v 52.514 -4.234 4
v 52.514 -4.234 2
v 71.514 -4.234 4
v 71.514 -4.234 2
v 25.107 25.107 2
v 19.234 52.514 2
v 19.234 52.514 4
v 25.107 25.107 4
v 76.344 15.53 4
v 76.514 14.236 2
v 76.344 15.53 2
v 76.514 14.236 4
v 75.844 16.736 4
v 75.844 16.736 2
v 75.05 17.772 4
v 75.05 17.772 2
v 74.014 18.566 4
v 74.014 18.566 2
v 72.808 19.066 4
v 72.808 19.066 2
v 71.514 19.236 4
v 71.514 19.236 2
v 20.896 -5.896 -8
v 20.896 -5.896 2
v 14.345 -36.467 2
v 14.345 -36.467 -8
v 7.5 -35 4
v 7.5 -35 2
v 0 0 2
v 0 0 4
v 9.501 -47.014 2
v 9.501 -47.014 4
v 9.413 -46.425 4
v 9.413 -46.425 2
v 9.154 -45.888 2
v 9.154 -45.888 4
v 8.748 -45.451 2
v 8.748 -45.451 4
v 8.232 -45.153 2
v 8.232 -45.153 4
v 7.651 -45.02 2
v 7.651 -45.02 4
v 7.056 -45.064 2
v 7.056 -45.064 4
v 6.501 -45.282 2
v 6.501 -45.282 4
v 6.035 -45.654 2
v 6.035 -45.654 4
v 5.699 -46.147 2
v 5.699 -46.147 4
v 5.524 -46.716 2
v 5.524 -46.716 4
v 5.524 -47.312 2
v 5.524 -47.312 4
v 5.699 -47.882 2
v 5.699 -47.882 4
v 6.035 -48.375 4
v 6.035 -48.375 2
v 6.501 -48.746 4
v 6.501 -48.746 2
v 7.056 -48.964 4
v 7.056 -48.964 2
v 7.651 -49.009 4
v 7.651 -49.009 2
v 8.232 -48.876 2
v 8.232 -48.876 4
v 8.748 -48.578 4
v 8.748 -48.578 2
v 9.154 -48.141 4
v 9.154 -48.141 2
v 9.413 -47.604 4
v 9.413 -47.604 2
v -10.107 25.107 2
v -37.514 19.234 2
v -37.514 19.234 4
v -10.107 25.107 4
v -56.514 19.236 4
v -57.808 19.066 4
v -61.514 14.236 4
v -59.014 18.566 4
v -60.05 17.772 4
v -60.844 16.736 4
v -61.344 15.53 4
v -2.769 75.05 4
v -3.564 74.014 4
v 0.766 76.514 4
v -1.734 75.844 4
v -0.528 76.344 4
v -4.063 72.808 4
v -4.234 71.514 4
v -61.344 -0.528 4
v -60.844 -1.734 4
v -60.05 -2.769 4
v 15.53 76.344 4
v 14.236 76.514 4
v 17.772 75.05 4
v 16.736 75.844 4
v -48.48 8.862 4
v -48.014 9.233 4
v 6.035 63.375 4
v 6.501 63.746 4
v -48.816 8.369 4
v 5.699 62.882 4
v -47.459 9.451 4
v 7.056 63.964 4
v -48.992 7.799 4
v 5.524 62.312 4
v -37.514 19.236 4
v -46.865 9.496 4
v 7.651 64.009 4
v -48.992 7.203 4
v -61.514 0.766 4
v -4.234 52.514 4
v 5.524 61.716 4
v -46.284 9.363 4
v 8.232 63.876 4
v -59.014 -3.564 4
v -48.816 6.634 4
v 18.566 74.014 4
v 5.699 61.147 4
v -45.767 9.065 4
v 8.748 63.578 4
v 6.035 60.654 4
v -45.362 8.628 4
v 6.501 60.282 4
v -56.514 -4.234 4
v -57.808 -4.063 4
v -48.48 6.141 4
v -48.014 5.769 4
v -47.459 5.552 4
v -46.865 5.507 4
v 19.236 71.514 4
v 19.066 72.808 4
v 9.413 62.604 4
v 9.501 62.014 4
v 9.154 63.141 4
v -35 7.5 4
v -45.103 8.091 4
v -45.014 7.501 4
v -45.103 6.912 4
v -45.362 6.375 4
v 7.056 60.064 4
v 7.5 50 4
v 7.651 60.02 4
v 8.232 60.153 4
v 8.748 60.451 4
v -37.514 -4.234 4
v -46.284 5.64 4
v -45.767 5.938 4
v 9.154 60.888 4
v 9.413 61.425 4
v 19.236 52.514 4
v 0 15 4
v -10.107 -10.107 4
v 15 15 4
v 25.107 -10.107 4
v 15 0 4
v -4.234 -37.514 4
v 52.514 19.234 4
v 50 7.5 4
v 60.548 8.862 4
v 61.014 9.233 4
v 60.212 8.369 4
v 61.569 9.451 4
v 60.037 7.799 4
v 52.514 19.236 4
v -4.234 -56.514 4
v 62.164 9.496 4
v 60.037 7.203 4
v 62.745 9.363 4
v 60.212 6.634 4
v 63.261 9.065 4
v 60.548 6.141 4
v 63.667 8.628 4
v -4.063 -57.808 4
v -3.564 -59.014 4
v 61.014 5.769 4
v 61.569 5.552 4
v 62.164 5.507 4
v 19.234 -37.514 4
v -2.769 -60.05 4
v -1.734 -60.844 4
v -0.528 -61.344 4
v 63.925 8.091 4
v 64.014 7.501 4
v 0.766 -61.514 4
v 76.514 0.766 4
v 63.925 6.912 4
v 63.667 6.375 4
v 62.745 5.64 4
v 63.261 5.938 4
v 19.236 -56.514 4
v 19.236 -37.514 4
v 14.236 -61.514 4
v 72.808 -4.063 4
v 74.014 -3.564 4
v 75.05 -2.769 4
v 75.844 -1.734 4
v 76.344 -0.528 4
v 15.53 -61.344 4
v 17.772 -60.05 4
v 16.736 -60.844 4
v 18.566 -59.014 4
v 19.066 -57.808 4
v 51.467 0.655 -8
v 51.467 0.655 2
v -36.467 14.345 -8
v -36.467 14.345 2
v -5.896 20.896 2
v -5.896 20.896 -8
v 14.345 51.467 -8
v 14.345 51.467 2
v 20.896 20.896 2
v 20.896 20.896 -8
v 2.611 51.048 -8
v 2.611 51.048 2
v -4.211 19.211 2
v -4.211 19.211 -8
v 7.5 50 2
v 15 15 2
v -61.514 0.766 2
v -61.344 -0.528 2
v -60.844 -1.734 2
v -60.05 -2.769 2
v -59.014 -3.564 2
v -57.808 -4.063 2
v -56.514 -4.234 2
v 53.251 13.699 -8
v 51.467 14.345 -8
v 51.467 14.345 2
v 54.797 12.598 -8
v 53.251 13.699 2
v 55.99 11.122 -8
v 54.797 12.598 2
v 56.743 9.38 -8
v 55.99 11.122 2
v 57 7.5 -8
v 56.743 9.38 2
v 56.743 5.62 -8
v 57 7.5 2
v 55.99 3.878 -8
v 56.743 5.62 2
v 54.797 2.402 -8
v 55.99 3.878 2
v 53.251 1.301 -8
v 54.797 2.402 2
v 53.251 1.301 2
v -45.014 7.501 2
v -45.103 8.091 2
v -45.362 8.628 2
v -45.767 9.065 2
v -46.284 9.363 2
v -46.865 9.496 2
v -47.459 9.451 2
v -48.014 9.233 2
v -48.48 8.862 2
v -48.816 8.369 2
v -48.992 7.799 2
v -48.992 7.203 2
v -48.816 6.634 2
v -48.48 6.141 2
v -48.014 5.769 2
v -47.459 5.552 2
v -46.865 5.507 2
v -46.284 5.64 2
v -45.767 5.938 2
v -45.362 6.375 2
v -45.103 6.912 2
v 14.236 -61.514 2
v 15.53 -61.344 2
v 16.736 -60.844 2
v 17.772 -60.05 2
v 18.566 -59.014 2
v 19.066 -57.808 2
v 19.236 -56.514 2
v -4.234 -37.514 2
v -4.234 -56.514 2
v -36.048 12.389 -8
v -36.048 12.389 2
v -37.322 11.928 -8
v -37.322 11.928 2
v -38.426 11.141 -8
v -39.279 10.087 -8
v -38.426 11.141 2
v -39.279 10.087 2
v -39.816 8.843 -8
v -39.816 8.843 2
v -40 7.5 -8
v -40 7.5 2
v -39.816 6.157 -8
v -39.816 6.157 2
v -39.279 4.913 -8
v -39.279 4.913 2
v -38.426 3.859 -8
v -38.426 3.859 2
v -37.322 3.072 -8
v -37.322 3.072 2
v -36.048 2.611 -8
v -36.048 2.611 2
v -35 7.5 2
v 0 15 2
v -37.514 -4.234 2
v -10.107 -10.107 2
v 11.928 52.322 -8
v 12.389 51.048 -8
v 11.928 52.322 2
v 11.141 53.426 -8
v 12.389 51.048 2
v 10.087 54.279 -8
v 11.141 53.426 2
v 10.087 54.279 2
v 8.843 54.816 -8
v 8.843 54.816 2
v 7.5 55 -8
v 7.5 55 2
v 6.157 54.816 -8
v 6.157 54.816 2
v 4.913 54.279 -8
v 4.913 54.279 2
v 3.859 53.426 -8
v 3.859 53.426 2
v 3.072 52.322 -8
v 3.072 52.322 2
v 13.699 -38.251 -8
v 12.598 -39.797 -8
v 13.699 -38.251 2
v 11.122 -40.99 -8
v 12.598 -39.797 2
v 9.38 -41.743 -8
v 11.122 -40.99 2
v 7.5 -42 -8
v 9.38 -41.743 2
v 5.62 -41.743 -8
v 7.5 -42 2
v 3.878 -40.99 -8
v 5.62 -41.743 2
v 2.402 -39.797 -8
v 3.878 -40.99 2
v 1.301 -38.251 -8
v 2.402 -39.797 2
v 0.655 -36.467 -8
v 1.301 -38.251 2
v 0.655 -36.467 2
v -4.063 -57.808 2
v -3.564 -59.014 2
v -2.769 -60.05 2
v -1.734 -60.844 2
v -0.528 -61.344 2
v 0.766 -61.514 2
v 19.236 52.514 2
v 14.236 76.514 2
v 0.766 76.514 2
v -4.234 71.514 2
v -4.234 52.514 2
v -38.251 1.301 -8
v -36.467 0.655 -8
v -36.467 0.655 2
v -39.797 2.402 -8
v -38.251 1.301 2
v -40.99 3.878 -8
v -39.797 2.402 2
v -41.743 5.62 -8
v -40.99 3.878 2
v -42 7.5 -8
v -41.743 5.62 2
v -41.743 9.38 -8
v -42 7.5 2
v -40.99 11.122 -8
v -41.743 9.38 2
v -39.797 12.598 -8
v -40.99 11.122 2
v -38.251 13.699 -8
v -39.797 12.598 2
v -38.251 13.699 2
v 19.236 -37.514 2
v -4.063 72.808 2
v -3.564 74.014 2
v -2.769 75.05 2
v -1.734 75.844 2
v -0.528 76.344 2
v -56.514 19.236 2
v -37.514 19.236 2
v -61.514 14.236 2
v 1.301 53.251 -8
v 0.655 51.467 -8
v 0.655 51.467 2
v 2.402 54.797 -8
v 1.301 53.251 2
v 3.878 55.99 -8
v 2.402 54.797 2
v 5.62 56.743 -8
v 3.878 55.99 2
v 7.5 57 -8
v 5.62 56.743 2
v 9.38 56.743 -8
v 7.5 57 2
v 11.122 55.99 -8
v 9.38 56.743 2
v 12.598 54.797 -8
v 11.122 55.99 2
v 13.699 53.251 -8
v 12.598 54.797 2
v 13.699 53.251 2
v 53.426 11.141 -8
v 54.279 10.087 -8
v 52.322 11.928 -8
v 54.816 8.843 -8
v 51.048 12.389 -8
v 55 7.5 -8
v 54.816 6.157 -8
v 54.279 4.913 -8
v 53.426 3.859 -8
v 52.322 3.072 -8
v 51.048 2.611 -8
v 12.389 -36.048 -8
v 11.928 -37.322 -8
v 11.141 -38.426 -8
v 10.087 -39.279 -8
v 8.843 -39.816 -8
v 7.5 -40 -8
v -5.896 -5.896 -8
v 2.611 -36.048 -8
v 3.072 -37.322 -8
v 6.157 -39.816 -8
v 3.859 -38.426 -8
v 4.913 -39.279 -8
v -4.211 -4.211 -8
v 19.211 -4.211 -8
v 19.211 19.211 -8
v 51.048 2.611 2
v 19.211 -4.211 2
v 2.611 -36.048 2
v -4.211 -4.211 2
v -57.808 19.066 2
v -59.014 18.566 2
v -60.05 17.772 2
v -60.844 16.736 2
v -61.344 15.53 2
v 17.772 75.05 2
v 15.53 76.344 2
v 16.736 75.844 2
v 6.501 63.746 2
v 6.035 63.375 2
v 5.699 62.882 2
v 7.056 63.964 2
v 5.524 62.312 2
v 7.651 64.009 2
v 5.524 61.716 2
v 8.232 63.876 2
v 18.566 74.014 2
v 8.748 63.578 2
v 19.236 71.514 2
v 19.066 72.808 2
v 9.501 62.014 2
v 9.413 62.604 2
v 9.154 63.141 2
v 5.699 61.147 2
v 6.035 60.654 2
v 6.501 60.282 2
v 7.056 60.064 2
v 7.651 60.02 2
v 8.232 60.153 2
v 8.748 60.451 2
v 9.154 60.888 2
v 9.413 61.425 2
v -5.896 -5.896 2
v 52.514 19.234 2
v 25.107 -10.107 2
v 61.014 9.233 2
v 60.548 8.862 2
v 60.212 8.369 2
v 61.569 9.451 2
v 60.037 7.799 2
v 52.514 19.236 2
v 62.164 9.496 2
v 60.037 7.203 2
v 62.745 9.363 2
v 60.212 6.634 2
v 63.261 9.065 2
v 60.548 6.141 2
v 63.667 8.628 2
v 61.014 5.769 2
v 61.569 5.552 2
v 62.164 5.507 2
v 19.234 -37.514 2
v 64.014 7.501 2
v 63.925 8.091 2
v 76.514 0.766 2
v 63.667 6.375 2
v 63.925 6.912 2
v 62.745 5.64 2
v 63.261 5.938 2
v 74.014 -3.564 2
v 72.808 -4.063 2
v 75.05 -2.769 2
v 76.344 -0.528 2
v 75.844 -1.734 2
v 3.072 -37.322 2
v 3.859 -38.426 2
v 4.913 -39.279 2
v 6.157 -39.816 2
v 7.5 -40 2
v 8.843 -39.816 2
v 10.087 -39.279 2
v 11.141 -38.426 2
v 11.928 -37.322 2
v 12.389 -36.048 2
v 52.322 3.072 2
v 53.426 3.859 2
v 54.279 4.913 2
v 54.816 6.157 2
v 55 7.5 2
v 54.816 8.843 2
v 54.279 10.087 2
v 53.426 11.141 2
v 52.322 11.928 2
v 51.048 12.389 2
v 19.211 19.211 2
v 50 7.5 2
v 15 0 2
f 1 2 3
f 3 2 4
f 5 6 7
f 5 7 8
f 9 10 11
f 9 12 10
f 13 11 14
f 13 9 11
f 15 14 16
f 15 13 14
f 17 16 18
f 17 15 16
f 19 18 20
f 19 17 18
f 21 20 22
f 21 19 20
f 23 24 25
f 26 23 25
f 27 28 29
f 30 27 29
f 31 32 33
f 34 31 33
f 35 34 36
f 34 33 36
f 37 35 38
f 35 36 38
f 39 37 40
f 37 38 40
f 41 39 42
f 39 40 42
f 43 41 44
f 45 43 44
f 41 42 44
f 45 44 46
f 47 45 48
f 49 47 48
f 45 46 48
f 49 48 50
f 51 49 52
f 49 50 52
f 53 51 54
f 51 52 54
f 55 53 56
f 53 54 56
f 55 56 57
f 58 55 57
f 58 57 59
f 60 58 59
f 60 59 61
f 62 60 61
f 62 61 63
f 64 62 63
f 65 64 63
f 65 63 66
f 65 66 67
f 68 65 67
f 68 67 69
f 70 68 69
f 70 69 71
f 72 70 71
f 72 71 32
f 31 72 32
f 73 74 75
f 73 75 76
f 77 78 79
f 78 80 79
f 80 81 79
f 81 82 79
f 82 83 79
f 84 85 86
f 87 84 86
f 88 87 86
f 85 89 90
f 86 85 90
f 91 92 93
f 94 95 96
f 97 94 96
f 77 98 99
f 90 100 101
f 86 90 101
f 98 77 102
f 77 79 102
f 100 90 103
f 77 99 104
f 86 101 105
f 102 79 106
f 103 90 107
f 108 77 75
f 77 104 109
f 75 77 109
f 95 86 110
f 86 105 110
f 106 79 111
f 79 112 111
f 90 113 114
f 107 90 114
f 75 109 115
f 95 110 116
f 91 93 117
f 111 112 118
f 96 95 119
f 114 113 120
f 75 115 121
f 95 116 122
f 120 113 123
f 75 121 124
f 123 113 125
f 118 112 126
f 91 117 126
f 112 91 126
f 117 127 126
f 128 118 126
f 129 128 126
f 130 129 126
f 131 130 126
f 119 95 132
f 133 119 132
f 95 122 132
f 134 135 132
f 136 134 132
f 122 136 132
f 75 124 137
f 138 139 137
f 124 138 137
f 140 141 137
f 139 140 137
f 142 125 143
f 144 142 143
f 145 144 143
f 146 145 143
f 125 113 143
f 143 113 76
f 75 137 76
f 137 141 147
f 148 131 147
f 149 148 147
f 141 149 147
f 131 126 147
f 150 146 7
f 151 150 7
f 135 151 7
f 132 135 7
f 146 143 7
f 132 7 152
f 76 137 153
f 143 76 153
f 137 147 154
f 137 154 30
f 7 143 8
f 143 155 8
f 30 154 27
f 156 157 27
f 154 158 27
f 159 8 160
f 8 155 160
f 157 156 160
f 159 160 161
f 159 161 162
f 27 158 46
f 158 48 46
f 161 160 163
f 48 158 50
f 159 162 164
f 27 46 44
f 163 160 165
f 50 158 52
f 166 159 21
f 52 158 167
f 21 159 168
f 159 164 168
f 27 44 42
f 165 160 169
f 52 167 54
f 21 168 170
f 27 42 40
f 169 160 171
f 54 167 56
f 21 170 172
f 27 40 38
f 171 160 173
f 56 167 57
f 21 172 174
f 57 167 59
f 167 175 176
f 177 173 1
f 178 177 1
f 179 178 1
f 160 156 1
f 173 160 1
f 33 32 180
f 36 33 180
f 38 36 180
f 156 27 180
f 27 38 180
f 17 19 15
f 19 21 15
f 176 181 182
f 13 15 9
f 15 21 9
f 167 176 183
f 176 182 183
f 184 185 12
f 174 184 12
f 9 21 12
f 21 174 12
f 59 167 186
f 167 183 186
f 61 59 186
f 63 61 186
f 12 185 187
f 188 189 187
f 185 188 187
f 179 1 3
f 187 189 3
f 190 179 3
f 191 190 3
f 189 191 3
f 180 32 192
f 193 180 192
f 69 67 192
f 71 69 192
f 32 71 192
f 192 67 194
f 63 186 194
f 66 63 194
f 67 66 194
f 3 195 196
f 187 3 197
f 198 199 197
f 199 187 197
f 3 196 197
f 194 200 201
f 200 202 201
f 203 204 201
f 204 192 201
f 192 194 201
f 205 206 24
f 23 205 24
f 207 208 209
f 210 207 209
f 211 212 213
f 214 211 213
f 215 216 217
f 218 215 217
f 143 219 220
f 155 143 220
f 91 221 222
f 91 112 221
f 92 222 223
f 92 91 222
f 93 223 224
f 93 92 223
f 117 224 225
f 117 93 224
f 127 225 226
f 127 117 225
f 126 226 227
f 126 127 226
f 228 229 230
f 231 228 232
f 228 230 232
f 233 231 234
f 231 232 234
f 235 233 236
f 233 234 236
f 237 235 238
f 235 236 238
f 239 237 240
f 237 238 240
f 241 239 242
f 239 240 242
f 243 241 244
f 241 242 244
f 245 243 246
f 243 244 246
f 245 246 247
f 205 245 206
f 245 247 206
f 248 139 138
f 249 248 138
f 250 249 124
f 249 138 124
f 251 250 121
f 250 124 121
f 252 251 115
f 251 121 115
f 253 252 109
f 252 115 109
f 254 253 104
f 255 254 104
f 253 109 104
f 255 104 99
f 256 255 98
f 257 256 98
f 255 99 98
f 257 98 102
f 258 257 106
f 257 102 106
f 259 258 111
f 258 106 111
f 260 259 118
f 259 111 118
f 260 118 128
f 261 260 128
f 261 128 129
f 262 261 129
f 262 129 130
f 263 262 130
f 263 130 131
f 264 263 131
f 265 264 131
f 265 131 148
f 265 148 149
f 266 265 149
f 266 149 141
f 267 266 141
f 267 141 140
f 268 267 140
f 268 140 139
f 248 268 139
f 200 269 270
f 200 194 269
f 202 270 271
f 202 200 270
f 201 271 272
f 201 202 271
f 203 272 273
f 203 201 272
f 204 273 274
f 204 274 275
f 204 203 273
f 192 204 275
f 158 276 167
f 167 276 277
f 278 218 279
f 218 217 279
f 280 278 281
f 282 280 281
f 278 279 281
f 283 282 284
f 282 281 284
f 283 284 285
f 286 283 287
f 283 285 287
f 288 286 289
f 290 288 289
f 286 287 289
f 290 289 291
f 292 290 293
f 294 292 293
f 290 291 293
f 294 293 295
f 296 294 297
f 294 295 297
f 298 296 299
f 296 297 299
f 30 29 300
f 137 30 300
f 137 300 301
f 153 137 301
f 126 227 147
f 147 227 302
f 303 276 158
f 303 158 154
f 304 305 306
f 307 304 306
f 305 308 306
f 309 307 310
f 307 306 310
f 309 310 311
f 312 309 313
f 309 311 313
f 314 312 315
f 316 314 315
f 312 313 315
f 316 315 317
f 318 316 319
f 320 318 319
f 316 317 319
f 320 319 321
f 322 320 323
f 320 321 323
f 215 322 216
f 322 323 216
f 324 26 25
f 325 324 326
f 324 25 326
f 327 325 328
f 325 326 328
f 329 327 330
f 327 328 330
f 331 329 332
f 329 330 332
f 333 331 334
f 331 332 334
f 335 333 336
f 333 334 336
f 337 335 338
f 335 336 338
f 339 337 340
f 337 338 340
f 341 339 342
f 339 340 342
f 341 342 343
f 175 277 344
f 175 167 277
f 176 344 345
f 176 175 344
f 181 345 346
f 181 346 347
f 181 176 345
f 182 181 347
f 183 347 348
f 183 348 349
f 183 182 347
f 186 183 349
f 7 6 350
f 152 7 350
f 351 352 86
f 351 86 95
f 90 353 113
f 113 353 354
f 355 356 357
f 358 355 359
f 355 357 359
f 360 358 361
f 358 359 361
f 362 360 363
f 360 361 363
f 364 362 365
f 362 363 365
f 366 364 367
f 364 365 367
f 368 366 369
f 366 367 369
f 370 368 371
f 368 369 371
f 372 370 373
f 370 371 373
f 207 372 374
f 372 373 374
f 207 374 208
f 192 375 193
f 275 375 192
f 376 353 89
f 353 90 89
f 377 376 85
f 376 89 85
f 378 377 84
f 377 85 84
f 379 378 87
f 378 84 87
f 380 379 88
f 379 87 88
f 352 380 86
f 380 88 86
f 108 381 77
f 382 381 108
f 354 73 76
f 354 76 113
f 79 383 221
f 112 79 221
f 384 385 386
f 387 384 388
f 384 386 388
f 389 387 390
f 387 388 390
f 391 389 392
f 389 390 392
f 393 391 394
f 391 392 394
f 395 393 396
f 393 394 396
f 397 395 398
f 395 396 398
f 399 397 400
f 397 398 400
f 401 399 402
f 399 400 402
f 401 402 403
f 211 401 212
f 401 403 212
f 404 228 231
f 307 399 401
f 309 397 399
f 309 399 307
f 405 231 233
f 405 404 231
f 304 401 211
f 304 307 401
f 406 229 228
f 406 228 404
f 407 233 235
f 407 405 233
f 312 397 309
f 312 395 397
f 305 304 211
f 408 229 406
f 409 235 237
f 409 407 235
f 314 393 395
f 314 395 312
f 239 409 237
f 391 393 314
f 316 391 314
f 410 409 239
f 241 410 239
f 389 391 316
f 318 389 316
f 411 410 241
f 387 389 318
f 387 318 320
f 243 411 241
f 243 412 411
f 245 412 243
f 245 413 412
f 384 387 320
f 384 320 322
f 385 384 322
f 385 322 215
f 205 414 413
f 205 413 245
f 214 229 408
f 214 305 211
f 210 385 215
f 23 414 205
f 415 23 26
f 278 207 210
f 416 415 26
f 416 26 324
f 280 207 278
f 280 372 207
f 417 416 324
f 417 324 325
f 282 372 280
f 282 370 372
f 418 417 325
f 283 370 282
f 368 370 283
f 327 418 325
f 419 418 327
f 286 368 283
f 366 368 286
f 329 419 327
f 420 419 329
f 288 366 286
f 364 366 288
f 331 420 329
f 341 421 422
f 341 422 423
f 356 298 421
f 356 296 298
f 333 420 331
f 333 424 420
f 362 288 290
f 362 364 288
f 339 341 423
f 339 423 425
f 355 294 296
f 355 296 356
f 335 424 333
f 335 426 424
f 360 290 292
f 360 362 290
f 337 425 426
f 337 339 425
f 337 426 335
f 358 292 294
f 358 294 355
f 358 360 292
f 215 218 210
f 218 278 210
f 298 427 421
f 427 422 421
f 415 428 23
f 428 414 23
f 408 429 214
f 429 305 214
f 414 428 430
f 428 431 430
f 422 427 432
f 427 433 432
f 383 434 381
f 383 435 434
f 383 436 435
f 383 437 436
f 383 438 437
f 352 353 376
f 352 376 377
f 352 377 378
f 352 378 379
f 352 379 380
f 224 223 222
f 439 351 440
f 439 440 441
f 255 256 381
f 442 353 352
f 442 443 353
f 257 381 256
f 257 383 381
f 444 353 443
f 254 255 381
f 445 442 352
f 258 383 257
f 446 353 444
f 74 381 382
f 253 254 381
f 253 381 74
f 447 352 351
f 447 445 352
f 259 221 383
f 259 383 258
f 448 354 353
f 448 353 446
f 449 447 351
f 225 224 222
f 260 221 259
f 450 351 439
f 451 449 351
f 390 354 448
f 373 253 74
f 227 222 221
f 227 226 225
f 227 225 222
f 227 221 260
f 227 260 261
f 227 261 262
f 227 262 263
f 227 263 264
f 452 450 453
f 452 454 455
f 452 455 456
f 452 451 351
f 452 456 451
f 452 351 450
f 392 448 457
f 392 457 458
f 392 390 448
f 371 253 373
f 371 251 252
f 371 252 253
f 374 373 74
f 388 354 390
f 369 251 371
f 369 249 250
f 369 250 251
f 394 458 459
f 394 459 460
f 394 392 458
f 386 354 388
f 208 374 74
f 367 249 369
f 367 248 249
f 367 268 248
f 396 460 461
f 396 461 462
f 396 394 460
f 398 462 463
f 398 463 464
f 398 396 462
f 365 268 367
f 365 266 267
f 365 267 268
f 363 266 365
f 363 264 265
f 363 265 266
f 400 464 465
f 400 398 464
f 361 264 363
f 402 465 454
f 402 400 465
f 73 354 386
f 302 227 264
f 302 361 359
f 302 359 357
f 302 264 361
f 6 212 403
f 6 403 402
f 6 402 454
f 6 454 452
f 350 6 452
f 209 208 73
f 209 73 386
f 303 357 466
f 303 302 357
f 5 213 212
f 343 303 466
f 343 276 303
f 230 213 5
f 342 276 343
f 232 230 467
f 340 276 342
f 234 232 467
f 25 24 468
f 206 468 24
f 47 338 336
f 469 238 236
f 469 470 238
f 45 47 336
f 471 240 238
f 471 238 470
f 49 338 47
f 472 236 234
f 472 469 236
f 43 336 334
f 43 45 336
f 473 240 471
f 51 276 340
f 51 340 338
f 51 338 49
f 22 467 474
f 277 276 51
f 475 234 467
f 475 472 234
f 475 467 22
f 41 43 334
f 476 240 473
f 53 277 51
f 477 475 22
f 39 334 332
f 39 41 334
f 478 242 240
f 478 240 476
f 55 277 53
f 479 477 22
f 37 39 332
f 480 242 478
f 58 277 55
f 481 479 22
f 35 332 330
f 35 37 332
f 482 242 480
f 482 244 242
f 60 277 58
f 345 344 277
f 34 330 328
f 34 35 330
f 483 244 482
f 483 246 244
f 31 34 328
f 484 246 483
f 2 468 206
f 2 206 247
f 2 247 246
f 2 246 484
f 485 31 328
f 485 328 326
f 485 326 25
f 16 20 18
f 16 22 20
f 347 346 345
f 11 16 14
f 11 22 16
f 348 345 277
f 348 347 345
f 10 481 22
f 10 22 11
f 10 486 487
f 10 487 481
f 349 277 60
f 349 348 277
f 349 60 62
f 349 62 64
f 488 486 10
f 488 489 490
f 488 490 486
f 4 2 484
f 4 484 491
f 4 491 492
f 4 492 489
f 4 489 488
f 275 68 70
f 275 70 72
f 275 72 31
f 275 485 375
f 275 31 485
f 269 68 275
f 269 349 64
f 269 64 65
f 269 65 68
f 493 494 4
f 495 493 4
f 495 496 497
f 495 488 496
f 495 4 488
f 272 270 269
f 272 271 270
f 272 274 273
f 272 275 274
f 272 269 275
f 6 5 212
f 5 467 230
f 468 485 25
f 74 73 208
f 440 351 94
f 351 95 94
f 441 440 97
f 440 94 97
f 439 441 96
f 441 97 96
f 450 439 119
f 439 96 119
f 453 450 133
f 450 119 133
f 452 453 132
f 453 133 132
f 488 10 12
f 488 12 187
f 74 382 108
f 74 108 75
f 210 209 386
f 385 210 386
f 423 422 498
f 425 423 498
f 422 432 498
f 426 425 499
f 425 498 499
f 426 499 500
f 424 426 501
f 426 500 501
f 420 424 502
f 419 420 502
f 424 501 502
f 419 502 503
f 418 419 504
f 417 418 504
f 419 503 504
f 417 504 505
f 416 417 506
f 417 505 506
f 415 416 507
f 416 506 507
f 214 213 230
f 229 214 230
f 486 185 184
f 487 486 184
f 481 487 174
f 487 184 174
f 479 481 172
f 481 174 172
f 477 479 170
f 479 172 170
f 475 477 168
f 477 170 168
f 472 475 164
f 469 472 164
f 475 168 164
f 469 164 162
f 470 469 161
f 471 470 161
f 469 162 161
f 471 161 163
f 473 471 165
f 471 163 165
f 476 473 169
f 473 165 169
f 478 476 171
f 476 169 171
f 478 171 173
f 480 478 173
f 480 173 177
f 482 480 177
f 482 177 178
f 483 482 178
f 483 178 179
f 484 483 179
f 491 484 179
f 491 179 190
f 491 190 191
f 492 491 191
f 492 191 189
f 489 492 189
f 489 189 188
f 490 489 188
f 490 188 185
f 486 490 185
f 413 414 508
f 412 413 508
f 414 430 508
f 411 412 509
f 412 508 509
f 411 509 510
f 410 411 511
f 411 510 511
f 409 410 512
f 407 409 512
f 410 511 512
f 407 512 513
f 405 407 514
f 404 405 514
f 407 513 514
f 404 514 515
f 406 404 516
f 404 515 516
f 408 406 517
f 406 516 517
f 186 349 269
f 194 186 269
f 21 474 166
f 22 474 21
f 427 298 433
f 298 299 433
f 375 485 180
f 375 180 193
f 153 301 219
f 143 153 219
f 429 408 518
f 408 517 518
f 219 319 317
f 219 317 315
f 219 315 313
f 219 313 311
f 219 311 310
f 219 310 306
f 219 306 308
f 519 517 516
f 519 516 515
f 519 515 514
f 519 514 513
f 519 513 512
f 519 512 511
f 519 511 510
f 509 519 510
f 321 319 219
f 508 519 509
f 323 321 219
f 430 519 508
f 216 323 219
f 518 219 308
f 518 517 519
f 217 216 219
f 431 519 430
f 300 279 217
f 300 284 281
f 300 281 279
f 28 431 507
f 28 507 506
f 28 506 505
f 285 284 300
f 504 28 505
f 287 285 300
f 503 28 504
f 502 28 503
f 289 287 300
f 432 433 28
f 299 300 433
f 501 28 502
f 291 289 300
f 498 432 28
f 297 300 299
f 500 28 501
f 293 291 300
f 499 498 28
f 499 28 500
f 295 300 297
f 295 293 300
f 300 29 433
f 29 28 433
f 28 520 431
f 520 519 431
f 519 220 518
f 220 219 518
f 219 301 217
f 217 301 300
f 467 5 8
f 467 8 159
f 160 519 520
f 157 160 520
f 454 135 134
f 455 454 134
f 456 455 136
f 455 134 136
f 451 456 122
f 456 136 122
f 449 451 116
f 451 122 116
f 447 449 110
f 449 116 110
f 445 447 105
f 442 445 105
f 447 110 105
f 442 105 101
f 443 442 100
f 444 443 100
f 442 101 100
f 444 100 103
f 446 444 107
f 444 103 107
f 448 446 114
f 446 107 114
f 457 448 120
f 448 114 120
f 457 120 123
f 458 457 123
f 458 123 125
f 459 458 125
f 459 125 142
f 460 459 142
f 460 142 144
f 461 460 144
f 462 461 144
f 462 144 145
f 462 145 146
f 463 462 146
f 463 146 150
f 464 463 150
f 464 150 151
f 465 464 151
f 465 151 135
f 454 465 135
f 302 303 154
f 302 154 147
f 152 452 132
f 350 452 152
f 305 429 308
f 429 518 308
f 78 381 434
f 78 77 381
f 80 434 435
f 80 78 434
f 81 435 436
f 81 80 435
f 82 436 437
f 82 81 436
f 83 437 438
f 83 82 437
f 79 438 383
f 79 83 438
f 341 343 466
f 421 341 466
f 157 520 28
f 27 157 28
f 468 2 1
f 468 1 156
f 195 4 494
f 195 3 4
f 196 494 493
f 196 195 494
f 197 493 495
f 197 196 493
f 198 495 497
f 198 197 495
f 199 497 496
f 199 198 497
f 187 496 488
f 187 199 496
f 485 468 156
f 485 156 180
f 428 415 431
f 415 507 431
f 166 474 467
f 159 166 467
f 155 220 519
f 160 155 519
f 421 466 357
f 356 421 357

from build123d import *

# Parameters (mm, degrees)
PAD_DEPTH       = 2
PAD001_DEPTH    = 2
PAD002_DEPTH    = 12
POCKET_DEPTH    = 2
PAD003_DEPTH    = 2
POCKET001_DEPTH = 2
POCKET002_DEPTH = 2
SKETCH004_W     = 23.47
SKETCH004_H     = 24
SKETCH004_W_2   = 24
SKETCH004_H_2   = 23.47
PAD004_DEPTH    = 2
FILLET_R        = 5
FILLET001_R     = 5
FILLET002_R     = 5
SKETCH005_R     = 2
POCKET003_DEPTH = 5


with BuildPart() as part:
    # Sketch → Pad (new body)
    with BuildSketch(Plane.XY):
        with BuildLine():
            Line((-4.211124, 19.211124), (2.610988, 51.047645))
            ThreePointArc((12.389012, 51.047645), (7.5, 55), (2.610988, 51.047645))
            Line((12.389012, 51.047645), (19.211124, 19.211124))
            Line((51.047645, 12.389012), (19.211124, 19.211124))
            ThreePointArc((51.047645, 2.610988), (55, 7.5), (51.047645, 12.389012))
            Line((19.211124, -4.211124), (51.047645, 2.610988))
            Line((12.389012, -36.047645), (19.211124, -4.211124))
            ThreePointArc((2.610988, -36.047645), (7.5, -40), (12.389012, -36.047645))
            Line((-4.211124, -4.211124), (2.610988, -36.047645))
            Line((-4.211124, -4.211124), (-36.047645, 2.610988))
            ThreePointArc((-36.047645, 12.389012), (-40, 7.5), (-36.047645, 2.610988))
            Line((-36.047645, 12.389012), (-4.211124, 19.211124))
        make_face()
        Polygon((15, 0), (50, 7.5), (15, 15), (7.5, 50), (0, 15), (-35, 7.5), (0, 0), (7.5, -35), align=None, mode=Mode.SUBTRACT)
    extrude(amount=PAD_DEPTH)

    # Sketch002 (on Face22 of Pad) → Pad001 (join)
    with BuildSketch(Plane.XY.offset(2)):
        with BuildLine():
            Line((-5.895573, 20.895573), (0.655383, 51.466704))
            ThreePointArc((14.344617, 51.466704), (7.5, 57), (0.655383, 51.466704))
            Line((14.344617, 51.466704), (20.895573, 20.895573))
            Line((51.466704, 14.344617), (20.895573, 20.895573))
            ThreePointArc((51.466704, 0.655383), (57, 7.5), (51.466704, 14.344617))
            Line((20.895573, -5.895573), (51.466704, 0.655383))
            Line((20.895573, -5.895573), (14.344617, -36.466704))
            ThreePointArc((0.655383, -36.466704), (7.5, -42), (14.344617, -36.466704))
            Line((0.655383, -36.466704), (-5.895573, -5.895573))
            Line((-5.895573, -5.895573), (-36.466704, 0.655383))
            ThreePointArc((-36.466704, 14.344617), (-42, 7.5), (-36.466704, 0.655383))
            Line((-5.895573, 20.895573), (-36.466704, 14.344617))
        make_face()
        Polygon((7.5, 50), (15, 15), (50, 7.5), (15, 0), (7.5, -35), (0, 0), (-35, 7.5), (0, 15), align=None, mode=Mode.SUBTRACT)
    extrude(amount=PAD001_DEPTH)

    # Pad001 Face5 → Pad002 (add)
    with BuildSketch(Plane(origin=(7.5, 7.5, 2), x_dir=(0, -1, 0), z_dir=(0, 0, -1))):
        with BuildLine():
            Line((-13.395573, 13.395573), (-43.966704, 6.844617))
            ThreePointArc((-43.966704, 6.844617), (-49.5, 0), (-43.966704, -6.844617))
            Line((-43.966704, -6.844617), (-13.395573, -13.395573))
            Line((-13.395573, -13.395573), (-6.844617, -43.966704))
            ThreePointArc((-6.844617, -43.966704), (0, -49.5), (6.844617, -43.966704))
            Line((6.844617, -43.966704), (13.395573, -13.395573))
            Line((13.395573, -13.395573), (43.966704, -6.844617))
            ThreePointArc((43.966704, -6.844617), (49.5, 0), (43.966704, 6.844617))
            Line((43.966704, 6.844617), (13.395573, 13.395573))
            Line((13.395573, 13.395573), (6.844617, 43.966704))
            ThreePointArc((6.844617, 43.966704), (0, 49.5), (-6.844617, 43.966704))
            Line((-6.844617, 43.966704), (-13.395573, 13.395573))
        make_face()
        with BuildLine():
            Line((-11.711124, 11.711124), (-4.889012, 43.547645))
            ThreePointArc((-4.889012, 43.547645), (0, 47.5), (4.889012, 43.547645))
            Line((4.889012, 43.547645), (11.711124, 11.711124))
            Line((11.711124, 11.711124), (43.547645, 4.889012))
            ThreePointArc((43.547645, 4.889012), (47.5, 0), (43.547645, -4.889012))
            Line((43.547645, -4.889012), (11.711124, -11.711124))
            Line((11.711124, -11.711124), (4.889012, -43.547645))
            ThreePointArc((4.889012, -43.547645), (0, -47.5), (-4.889012, -43.547645))
            Line((-4.889012, -43.547645), (-11.711124, -11.711124))
            Line((-11.711124, -11.711124), (-43.547645, -4.889012))
            ThreePointArc((-43.547645, -4.889012), (-47.5, 0), (-43.547645, 4.889012))
            Line((-43.547645, 4.889012), (-11.711124, 11.711124))
        make_face(mode=Mode.SUBTRACT)
    extrude(amount=PAD002_DEPTH)

    # Pad002 Face23 → Pocket (cut)
    with BuildSketch(Plane(origin=(7.5, 7.5, 4), x_dir=(0, 1, 0), z_dir=(0, 0, 1))):
        with BuildLine():
            Line((43.966704, 6.844617), (13.395573, 13.395573))
            Line((13.395573, 13.395573), (6.844617, 43.966704))
            ThreePointArc((6.844617, 43.966704), (0, 49.5), (-6.844617, 43.966704))
            Line((-6.844617, 43.966704), (-13.395573, 13.395573))
            Line((-13.395573, 13.395573), (-43.966704, 6.844617))
            ThreePointArc((-43.966704, 6.844617), (-49.5, 0), (-43.966704, -6.844617))
            Line((-43.966704, -6.844617), (-13.395573, -13.395573))
            Line((-13.395573, -13.395573), (-6.844617, -43.966704))
            ThreePointArc((-6.844617, -43.966704), (0, -49.5), (6.844617, -43.966704))
            Line((6.844617, -43.966704), (13.395573, -13.395573))
            Line((13.395573, -13.395573), (43.966704, -6.844617))
            ThreePointArc((43.966704, -6.844617), (49.5, 0), (43.966704, 6.844617))
        make_face()
        Polygon((42.5, 0), (7.5, -7.5), (0, -42.5), (-7.5, -7.5), (-42.5, 0), (-7.5, 7.5), (0, 42.5), (7.5, 7.5), align=None, mode=Mode.SUBTRACT)
    extrude(amount=-POCKET_DEPTH, mode=Mode.SUBTRACT)

    # Sketch003 (on Face23 of Pocket) → Pad003 (join)
    with BuildSketch(Plane.XY.offset(2)):
        with BuildLine():
            Line((-10.106697, 25.106697), (-4.233629, 52.514349))
            ThreePointArc((19.233629, 52.514349), (7.5, 62), (-4.233629, 52.514349))
            Line((19.233629, 52.514349), (25.106697, 25.106697))
            Line((25.106697, 25.106697), (52.514349, 19.233629))
            ThreePointArc((52.514349, -4.233629), (62, 7.5), (52.514349, 19.233629))
            Line((52.514349, -4.233629), (25.106697, -10.106697))
            Line((25.106697, -10.106697), (19.233629, -37.514349))
            ThreePointArc((-4.233629, -37.514349), (7.5, -47), (19.233629, -37.514349))
            Line((-4.233629, -37.514349), (-10.106697, -10.106697))
            Line((-10.106697, -10.106697), (-37.514349, -4.233629))
            ThreePointArc((-37.514349, 19.233629), (-47, 7.5), (-37.514349, -4.233629))
            Line((-37.514349, 19.233629), (-10.106697, 25.106697))
        make_face()
        Polygon((7.5, 50), (15, 15), (50, 7.5), (15, 0), (7.5, -35), (0, 0), (-35, 7.5), (0, 15), align=None, mode=Mode.SUBTRACT)
    extrude(amount=PAD003_DEPTH)

    # Pad003 Face1 → Pocket001 (cut)
    with BuildSketch(Plane(origin=(7.5, 7.5, 0), x_dir=(0, -1, 0), z_dir=(0, 0, -1))):
        with BuildLine():
            Line((-11.711124, 11.711124), (-43.547645, 4.889012))
            ThreePointArc((-43.547645, 4.889012), (-47.5, 0), (-43.547645, -4.889012))
            Line((-43.547645, -4.889012), (-11.711124, -11.711124))
            Line((-11.711124, -11.711124), (-4.889012, -43.547645))
            ThreePointArc((-4.889012, -43.547645), (0, -47.5), (4.889012, -43.547645))
            Line((4.889012, -43.547645), (11.711124, -11.711124))
            Line((11.711124, -11.711124), (43.547645, -4.889012))
            ThreePointArc((43.547645, -4.889012), (47.5, 0), (43.547645, 4.889012))
            Line((43.547645, 4.889012), (11.711124, 11.711124))
            Line((11.711124, 11.711124), (4.889012, 43.547645))
            ThreePointArc((4.889012, 43.547645), (0, 47.5), (-4.889012, 43.547645))
            Line((-4.889012, 43.547645), (-11.711124, 11.711124))
        make_face()
        Polygon((7.5, 7.5), (42.5, 0), (7.5, -7.5), (0, -42.5), (-7.5, -7.5), (-42.5, 0), (-7.5, 7.5), (0, 42.5), align=None, mode=Mode.SUBTRACT)
    extrude(amount=-POCKET001_DEPTH, mode=Mode.SUBTRACT)

    # Pocket001 Face1 → Pocket002 (cut)
    with BuildSketch(Plane(origin=(7.5, 7.5, -10), x_dir=(0, -1, 0), z_dir=(0, 0, -1))):
        with BuildLine():
            Line((-13.395573, 13.395573), (-43.966704, 6.844617))
            ThreePointArc((-43.966704, 6.844617), (-49.5, 0), (-43.966704, -6.844617))
            Line((-43.966704, -6.844617), (-13.395573, -13.395573))
            Line((-13.395573, -13.395573), (-6.844617, -43.966704))
            ThreePointArc((-6.844617, -43.966704), (0, -49.5), (6.844617, -43.966704))
            Line((6.844617, -43.966704), (13.395573, -13.395573))
            Line((13.395573, -13.395573), (43.966704, -6.844617))
            ThreePointArc((43.966704, -6.844617), (49.5, 0), (43.966704, 6.844617))
            Line((43.966704, 6.844617), (13.395573, 13.395573))
            Line((13.395573, 13.395573), (6.844617, 43.966704))
            ThreePointArc((6.844617, 43.966704), (0, 49.5), (-6.844617, 43.966704))
            Line((-6.844617, 43.966704), (-13.395573, 13.395573))
        make_face()
        with BuildLine():
            Line((-11.711124, 11.711124), (-4.889012, 43.547645))
            ThreePointArc((-4.889012, 43.547645), (0, 47.5), (4.889012, 43.547645))
            Line((4.889012, 43.547645), (11.711124, 11.711124))
            Line((11.711124, 11.711124), (43.547645, 4.889012))
            ThreePointArc((43.547645, 4.889012), (47.5, 0), (43.547645, -4.889012))
            Line((43.547645, -4.889012), (11.711124, -11.711124))
            Line((11.711124, -11.711124), (4.889012, -43.547645))
            ThreePointArc((4.889012, -43.547645), (0, -47.5), (-4.889012, -43.547645))
            Line((-4.889012, -43.547645), (-11.711124, -11.711124))
            Line((-11.711124, -11.711124), (-43.547645, -4.889012))
            ThreePointArc((-43.547645, -4.889012), (-47.5, 0), (-43.547645, 4.889012))
            Line((-43.547645, 4.889012), (-11.711124, 11.711124))
        make_face(mode=Mode.SUBTRACT)
    extrude(amount=-POCKET002_DEPTH, mode=Mode.SUBTRACT)

    # Sketch004 (on Face5 of Pocket002) → Pad004 (join)
    with BuildSketch(Plane(origin=(0, 0, 2), x_dir=(1, 0, 0), z_dir=(0, 0, -1))):
        with Locations((7.501371, -64.514349)):
            Rectangle(SKETCH004_W, SKETCH004_H)
        with Locations((64.514349, -7.501371)):
            Rectangle(SKETCH004_W_2, SKETCH004_H_2)
        with Locations((7.501371, 49.514349)):
            Rectangle(SKETCH004_W, SKETCH004_H)
        with Locations((-49.514349, -7.501371)):
            Rectangle(SKETCH004_W_2, SKETCH004_H_2)
    extrude(amount=-PAD004_DEPTH)

    # Fillet
    fillet_edges = [part.edges().sort_by_distance(p)[0] for p in [
        (-61.514349, 19.236371, 3),
        (-61.514349, -4.233629, 3),
    ]]
    fillet(fillet_edges, radius=FILLET_R)

    # Fillet001
    fillet001_edges = [part.edges().sort_by_distance(p)[0] for p in [
        (-4.233629, -61.514349, 3),
        (19.236371, -61.514349, 3),
        (76.514349, -4.233629, 3),
        (76.514349, 19.236371, 3),
    ]]
    fillet(fillet001_edges, radius=FILLET001_R)

    # Fillet002
    fillet002_edges = [part.edges().sort_by_distance(p)[0] for p in [
        (-4.233629, 76.514349, 3),
        (19.236371, 76.514349, 3),
    ]]
    fillet(fillet002_edges, radius=FILLET002_R)

    # Sketch005 (on Face46 of Fillet002) → Pocket003 (cut)
    with BuildSketch(Plane.XY.offset(4)):
        with Locations((7.501371, 62.014349)):
            Circle(SKETCH005_R)
        with Locations((7.501371, -47.014349)):
            Circle(SKETCH005_R)
        with Locations((62.014349, 7.501371)):
            Circle(SKETCH005_R)
        with Locations((-47.014349, 7.501371)):
            Circle(SKETCH005_R)
    extrude(amount=-POCKET003_DEPTH, mode=Mode.SUBTRACT)


solid = part.part
